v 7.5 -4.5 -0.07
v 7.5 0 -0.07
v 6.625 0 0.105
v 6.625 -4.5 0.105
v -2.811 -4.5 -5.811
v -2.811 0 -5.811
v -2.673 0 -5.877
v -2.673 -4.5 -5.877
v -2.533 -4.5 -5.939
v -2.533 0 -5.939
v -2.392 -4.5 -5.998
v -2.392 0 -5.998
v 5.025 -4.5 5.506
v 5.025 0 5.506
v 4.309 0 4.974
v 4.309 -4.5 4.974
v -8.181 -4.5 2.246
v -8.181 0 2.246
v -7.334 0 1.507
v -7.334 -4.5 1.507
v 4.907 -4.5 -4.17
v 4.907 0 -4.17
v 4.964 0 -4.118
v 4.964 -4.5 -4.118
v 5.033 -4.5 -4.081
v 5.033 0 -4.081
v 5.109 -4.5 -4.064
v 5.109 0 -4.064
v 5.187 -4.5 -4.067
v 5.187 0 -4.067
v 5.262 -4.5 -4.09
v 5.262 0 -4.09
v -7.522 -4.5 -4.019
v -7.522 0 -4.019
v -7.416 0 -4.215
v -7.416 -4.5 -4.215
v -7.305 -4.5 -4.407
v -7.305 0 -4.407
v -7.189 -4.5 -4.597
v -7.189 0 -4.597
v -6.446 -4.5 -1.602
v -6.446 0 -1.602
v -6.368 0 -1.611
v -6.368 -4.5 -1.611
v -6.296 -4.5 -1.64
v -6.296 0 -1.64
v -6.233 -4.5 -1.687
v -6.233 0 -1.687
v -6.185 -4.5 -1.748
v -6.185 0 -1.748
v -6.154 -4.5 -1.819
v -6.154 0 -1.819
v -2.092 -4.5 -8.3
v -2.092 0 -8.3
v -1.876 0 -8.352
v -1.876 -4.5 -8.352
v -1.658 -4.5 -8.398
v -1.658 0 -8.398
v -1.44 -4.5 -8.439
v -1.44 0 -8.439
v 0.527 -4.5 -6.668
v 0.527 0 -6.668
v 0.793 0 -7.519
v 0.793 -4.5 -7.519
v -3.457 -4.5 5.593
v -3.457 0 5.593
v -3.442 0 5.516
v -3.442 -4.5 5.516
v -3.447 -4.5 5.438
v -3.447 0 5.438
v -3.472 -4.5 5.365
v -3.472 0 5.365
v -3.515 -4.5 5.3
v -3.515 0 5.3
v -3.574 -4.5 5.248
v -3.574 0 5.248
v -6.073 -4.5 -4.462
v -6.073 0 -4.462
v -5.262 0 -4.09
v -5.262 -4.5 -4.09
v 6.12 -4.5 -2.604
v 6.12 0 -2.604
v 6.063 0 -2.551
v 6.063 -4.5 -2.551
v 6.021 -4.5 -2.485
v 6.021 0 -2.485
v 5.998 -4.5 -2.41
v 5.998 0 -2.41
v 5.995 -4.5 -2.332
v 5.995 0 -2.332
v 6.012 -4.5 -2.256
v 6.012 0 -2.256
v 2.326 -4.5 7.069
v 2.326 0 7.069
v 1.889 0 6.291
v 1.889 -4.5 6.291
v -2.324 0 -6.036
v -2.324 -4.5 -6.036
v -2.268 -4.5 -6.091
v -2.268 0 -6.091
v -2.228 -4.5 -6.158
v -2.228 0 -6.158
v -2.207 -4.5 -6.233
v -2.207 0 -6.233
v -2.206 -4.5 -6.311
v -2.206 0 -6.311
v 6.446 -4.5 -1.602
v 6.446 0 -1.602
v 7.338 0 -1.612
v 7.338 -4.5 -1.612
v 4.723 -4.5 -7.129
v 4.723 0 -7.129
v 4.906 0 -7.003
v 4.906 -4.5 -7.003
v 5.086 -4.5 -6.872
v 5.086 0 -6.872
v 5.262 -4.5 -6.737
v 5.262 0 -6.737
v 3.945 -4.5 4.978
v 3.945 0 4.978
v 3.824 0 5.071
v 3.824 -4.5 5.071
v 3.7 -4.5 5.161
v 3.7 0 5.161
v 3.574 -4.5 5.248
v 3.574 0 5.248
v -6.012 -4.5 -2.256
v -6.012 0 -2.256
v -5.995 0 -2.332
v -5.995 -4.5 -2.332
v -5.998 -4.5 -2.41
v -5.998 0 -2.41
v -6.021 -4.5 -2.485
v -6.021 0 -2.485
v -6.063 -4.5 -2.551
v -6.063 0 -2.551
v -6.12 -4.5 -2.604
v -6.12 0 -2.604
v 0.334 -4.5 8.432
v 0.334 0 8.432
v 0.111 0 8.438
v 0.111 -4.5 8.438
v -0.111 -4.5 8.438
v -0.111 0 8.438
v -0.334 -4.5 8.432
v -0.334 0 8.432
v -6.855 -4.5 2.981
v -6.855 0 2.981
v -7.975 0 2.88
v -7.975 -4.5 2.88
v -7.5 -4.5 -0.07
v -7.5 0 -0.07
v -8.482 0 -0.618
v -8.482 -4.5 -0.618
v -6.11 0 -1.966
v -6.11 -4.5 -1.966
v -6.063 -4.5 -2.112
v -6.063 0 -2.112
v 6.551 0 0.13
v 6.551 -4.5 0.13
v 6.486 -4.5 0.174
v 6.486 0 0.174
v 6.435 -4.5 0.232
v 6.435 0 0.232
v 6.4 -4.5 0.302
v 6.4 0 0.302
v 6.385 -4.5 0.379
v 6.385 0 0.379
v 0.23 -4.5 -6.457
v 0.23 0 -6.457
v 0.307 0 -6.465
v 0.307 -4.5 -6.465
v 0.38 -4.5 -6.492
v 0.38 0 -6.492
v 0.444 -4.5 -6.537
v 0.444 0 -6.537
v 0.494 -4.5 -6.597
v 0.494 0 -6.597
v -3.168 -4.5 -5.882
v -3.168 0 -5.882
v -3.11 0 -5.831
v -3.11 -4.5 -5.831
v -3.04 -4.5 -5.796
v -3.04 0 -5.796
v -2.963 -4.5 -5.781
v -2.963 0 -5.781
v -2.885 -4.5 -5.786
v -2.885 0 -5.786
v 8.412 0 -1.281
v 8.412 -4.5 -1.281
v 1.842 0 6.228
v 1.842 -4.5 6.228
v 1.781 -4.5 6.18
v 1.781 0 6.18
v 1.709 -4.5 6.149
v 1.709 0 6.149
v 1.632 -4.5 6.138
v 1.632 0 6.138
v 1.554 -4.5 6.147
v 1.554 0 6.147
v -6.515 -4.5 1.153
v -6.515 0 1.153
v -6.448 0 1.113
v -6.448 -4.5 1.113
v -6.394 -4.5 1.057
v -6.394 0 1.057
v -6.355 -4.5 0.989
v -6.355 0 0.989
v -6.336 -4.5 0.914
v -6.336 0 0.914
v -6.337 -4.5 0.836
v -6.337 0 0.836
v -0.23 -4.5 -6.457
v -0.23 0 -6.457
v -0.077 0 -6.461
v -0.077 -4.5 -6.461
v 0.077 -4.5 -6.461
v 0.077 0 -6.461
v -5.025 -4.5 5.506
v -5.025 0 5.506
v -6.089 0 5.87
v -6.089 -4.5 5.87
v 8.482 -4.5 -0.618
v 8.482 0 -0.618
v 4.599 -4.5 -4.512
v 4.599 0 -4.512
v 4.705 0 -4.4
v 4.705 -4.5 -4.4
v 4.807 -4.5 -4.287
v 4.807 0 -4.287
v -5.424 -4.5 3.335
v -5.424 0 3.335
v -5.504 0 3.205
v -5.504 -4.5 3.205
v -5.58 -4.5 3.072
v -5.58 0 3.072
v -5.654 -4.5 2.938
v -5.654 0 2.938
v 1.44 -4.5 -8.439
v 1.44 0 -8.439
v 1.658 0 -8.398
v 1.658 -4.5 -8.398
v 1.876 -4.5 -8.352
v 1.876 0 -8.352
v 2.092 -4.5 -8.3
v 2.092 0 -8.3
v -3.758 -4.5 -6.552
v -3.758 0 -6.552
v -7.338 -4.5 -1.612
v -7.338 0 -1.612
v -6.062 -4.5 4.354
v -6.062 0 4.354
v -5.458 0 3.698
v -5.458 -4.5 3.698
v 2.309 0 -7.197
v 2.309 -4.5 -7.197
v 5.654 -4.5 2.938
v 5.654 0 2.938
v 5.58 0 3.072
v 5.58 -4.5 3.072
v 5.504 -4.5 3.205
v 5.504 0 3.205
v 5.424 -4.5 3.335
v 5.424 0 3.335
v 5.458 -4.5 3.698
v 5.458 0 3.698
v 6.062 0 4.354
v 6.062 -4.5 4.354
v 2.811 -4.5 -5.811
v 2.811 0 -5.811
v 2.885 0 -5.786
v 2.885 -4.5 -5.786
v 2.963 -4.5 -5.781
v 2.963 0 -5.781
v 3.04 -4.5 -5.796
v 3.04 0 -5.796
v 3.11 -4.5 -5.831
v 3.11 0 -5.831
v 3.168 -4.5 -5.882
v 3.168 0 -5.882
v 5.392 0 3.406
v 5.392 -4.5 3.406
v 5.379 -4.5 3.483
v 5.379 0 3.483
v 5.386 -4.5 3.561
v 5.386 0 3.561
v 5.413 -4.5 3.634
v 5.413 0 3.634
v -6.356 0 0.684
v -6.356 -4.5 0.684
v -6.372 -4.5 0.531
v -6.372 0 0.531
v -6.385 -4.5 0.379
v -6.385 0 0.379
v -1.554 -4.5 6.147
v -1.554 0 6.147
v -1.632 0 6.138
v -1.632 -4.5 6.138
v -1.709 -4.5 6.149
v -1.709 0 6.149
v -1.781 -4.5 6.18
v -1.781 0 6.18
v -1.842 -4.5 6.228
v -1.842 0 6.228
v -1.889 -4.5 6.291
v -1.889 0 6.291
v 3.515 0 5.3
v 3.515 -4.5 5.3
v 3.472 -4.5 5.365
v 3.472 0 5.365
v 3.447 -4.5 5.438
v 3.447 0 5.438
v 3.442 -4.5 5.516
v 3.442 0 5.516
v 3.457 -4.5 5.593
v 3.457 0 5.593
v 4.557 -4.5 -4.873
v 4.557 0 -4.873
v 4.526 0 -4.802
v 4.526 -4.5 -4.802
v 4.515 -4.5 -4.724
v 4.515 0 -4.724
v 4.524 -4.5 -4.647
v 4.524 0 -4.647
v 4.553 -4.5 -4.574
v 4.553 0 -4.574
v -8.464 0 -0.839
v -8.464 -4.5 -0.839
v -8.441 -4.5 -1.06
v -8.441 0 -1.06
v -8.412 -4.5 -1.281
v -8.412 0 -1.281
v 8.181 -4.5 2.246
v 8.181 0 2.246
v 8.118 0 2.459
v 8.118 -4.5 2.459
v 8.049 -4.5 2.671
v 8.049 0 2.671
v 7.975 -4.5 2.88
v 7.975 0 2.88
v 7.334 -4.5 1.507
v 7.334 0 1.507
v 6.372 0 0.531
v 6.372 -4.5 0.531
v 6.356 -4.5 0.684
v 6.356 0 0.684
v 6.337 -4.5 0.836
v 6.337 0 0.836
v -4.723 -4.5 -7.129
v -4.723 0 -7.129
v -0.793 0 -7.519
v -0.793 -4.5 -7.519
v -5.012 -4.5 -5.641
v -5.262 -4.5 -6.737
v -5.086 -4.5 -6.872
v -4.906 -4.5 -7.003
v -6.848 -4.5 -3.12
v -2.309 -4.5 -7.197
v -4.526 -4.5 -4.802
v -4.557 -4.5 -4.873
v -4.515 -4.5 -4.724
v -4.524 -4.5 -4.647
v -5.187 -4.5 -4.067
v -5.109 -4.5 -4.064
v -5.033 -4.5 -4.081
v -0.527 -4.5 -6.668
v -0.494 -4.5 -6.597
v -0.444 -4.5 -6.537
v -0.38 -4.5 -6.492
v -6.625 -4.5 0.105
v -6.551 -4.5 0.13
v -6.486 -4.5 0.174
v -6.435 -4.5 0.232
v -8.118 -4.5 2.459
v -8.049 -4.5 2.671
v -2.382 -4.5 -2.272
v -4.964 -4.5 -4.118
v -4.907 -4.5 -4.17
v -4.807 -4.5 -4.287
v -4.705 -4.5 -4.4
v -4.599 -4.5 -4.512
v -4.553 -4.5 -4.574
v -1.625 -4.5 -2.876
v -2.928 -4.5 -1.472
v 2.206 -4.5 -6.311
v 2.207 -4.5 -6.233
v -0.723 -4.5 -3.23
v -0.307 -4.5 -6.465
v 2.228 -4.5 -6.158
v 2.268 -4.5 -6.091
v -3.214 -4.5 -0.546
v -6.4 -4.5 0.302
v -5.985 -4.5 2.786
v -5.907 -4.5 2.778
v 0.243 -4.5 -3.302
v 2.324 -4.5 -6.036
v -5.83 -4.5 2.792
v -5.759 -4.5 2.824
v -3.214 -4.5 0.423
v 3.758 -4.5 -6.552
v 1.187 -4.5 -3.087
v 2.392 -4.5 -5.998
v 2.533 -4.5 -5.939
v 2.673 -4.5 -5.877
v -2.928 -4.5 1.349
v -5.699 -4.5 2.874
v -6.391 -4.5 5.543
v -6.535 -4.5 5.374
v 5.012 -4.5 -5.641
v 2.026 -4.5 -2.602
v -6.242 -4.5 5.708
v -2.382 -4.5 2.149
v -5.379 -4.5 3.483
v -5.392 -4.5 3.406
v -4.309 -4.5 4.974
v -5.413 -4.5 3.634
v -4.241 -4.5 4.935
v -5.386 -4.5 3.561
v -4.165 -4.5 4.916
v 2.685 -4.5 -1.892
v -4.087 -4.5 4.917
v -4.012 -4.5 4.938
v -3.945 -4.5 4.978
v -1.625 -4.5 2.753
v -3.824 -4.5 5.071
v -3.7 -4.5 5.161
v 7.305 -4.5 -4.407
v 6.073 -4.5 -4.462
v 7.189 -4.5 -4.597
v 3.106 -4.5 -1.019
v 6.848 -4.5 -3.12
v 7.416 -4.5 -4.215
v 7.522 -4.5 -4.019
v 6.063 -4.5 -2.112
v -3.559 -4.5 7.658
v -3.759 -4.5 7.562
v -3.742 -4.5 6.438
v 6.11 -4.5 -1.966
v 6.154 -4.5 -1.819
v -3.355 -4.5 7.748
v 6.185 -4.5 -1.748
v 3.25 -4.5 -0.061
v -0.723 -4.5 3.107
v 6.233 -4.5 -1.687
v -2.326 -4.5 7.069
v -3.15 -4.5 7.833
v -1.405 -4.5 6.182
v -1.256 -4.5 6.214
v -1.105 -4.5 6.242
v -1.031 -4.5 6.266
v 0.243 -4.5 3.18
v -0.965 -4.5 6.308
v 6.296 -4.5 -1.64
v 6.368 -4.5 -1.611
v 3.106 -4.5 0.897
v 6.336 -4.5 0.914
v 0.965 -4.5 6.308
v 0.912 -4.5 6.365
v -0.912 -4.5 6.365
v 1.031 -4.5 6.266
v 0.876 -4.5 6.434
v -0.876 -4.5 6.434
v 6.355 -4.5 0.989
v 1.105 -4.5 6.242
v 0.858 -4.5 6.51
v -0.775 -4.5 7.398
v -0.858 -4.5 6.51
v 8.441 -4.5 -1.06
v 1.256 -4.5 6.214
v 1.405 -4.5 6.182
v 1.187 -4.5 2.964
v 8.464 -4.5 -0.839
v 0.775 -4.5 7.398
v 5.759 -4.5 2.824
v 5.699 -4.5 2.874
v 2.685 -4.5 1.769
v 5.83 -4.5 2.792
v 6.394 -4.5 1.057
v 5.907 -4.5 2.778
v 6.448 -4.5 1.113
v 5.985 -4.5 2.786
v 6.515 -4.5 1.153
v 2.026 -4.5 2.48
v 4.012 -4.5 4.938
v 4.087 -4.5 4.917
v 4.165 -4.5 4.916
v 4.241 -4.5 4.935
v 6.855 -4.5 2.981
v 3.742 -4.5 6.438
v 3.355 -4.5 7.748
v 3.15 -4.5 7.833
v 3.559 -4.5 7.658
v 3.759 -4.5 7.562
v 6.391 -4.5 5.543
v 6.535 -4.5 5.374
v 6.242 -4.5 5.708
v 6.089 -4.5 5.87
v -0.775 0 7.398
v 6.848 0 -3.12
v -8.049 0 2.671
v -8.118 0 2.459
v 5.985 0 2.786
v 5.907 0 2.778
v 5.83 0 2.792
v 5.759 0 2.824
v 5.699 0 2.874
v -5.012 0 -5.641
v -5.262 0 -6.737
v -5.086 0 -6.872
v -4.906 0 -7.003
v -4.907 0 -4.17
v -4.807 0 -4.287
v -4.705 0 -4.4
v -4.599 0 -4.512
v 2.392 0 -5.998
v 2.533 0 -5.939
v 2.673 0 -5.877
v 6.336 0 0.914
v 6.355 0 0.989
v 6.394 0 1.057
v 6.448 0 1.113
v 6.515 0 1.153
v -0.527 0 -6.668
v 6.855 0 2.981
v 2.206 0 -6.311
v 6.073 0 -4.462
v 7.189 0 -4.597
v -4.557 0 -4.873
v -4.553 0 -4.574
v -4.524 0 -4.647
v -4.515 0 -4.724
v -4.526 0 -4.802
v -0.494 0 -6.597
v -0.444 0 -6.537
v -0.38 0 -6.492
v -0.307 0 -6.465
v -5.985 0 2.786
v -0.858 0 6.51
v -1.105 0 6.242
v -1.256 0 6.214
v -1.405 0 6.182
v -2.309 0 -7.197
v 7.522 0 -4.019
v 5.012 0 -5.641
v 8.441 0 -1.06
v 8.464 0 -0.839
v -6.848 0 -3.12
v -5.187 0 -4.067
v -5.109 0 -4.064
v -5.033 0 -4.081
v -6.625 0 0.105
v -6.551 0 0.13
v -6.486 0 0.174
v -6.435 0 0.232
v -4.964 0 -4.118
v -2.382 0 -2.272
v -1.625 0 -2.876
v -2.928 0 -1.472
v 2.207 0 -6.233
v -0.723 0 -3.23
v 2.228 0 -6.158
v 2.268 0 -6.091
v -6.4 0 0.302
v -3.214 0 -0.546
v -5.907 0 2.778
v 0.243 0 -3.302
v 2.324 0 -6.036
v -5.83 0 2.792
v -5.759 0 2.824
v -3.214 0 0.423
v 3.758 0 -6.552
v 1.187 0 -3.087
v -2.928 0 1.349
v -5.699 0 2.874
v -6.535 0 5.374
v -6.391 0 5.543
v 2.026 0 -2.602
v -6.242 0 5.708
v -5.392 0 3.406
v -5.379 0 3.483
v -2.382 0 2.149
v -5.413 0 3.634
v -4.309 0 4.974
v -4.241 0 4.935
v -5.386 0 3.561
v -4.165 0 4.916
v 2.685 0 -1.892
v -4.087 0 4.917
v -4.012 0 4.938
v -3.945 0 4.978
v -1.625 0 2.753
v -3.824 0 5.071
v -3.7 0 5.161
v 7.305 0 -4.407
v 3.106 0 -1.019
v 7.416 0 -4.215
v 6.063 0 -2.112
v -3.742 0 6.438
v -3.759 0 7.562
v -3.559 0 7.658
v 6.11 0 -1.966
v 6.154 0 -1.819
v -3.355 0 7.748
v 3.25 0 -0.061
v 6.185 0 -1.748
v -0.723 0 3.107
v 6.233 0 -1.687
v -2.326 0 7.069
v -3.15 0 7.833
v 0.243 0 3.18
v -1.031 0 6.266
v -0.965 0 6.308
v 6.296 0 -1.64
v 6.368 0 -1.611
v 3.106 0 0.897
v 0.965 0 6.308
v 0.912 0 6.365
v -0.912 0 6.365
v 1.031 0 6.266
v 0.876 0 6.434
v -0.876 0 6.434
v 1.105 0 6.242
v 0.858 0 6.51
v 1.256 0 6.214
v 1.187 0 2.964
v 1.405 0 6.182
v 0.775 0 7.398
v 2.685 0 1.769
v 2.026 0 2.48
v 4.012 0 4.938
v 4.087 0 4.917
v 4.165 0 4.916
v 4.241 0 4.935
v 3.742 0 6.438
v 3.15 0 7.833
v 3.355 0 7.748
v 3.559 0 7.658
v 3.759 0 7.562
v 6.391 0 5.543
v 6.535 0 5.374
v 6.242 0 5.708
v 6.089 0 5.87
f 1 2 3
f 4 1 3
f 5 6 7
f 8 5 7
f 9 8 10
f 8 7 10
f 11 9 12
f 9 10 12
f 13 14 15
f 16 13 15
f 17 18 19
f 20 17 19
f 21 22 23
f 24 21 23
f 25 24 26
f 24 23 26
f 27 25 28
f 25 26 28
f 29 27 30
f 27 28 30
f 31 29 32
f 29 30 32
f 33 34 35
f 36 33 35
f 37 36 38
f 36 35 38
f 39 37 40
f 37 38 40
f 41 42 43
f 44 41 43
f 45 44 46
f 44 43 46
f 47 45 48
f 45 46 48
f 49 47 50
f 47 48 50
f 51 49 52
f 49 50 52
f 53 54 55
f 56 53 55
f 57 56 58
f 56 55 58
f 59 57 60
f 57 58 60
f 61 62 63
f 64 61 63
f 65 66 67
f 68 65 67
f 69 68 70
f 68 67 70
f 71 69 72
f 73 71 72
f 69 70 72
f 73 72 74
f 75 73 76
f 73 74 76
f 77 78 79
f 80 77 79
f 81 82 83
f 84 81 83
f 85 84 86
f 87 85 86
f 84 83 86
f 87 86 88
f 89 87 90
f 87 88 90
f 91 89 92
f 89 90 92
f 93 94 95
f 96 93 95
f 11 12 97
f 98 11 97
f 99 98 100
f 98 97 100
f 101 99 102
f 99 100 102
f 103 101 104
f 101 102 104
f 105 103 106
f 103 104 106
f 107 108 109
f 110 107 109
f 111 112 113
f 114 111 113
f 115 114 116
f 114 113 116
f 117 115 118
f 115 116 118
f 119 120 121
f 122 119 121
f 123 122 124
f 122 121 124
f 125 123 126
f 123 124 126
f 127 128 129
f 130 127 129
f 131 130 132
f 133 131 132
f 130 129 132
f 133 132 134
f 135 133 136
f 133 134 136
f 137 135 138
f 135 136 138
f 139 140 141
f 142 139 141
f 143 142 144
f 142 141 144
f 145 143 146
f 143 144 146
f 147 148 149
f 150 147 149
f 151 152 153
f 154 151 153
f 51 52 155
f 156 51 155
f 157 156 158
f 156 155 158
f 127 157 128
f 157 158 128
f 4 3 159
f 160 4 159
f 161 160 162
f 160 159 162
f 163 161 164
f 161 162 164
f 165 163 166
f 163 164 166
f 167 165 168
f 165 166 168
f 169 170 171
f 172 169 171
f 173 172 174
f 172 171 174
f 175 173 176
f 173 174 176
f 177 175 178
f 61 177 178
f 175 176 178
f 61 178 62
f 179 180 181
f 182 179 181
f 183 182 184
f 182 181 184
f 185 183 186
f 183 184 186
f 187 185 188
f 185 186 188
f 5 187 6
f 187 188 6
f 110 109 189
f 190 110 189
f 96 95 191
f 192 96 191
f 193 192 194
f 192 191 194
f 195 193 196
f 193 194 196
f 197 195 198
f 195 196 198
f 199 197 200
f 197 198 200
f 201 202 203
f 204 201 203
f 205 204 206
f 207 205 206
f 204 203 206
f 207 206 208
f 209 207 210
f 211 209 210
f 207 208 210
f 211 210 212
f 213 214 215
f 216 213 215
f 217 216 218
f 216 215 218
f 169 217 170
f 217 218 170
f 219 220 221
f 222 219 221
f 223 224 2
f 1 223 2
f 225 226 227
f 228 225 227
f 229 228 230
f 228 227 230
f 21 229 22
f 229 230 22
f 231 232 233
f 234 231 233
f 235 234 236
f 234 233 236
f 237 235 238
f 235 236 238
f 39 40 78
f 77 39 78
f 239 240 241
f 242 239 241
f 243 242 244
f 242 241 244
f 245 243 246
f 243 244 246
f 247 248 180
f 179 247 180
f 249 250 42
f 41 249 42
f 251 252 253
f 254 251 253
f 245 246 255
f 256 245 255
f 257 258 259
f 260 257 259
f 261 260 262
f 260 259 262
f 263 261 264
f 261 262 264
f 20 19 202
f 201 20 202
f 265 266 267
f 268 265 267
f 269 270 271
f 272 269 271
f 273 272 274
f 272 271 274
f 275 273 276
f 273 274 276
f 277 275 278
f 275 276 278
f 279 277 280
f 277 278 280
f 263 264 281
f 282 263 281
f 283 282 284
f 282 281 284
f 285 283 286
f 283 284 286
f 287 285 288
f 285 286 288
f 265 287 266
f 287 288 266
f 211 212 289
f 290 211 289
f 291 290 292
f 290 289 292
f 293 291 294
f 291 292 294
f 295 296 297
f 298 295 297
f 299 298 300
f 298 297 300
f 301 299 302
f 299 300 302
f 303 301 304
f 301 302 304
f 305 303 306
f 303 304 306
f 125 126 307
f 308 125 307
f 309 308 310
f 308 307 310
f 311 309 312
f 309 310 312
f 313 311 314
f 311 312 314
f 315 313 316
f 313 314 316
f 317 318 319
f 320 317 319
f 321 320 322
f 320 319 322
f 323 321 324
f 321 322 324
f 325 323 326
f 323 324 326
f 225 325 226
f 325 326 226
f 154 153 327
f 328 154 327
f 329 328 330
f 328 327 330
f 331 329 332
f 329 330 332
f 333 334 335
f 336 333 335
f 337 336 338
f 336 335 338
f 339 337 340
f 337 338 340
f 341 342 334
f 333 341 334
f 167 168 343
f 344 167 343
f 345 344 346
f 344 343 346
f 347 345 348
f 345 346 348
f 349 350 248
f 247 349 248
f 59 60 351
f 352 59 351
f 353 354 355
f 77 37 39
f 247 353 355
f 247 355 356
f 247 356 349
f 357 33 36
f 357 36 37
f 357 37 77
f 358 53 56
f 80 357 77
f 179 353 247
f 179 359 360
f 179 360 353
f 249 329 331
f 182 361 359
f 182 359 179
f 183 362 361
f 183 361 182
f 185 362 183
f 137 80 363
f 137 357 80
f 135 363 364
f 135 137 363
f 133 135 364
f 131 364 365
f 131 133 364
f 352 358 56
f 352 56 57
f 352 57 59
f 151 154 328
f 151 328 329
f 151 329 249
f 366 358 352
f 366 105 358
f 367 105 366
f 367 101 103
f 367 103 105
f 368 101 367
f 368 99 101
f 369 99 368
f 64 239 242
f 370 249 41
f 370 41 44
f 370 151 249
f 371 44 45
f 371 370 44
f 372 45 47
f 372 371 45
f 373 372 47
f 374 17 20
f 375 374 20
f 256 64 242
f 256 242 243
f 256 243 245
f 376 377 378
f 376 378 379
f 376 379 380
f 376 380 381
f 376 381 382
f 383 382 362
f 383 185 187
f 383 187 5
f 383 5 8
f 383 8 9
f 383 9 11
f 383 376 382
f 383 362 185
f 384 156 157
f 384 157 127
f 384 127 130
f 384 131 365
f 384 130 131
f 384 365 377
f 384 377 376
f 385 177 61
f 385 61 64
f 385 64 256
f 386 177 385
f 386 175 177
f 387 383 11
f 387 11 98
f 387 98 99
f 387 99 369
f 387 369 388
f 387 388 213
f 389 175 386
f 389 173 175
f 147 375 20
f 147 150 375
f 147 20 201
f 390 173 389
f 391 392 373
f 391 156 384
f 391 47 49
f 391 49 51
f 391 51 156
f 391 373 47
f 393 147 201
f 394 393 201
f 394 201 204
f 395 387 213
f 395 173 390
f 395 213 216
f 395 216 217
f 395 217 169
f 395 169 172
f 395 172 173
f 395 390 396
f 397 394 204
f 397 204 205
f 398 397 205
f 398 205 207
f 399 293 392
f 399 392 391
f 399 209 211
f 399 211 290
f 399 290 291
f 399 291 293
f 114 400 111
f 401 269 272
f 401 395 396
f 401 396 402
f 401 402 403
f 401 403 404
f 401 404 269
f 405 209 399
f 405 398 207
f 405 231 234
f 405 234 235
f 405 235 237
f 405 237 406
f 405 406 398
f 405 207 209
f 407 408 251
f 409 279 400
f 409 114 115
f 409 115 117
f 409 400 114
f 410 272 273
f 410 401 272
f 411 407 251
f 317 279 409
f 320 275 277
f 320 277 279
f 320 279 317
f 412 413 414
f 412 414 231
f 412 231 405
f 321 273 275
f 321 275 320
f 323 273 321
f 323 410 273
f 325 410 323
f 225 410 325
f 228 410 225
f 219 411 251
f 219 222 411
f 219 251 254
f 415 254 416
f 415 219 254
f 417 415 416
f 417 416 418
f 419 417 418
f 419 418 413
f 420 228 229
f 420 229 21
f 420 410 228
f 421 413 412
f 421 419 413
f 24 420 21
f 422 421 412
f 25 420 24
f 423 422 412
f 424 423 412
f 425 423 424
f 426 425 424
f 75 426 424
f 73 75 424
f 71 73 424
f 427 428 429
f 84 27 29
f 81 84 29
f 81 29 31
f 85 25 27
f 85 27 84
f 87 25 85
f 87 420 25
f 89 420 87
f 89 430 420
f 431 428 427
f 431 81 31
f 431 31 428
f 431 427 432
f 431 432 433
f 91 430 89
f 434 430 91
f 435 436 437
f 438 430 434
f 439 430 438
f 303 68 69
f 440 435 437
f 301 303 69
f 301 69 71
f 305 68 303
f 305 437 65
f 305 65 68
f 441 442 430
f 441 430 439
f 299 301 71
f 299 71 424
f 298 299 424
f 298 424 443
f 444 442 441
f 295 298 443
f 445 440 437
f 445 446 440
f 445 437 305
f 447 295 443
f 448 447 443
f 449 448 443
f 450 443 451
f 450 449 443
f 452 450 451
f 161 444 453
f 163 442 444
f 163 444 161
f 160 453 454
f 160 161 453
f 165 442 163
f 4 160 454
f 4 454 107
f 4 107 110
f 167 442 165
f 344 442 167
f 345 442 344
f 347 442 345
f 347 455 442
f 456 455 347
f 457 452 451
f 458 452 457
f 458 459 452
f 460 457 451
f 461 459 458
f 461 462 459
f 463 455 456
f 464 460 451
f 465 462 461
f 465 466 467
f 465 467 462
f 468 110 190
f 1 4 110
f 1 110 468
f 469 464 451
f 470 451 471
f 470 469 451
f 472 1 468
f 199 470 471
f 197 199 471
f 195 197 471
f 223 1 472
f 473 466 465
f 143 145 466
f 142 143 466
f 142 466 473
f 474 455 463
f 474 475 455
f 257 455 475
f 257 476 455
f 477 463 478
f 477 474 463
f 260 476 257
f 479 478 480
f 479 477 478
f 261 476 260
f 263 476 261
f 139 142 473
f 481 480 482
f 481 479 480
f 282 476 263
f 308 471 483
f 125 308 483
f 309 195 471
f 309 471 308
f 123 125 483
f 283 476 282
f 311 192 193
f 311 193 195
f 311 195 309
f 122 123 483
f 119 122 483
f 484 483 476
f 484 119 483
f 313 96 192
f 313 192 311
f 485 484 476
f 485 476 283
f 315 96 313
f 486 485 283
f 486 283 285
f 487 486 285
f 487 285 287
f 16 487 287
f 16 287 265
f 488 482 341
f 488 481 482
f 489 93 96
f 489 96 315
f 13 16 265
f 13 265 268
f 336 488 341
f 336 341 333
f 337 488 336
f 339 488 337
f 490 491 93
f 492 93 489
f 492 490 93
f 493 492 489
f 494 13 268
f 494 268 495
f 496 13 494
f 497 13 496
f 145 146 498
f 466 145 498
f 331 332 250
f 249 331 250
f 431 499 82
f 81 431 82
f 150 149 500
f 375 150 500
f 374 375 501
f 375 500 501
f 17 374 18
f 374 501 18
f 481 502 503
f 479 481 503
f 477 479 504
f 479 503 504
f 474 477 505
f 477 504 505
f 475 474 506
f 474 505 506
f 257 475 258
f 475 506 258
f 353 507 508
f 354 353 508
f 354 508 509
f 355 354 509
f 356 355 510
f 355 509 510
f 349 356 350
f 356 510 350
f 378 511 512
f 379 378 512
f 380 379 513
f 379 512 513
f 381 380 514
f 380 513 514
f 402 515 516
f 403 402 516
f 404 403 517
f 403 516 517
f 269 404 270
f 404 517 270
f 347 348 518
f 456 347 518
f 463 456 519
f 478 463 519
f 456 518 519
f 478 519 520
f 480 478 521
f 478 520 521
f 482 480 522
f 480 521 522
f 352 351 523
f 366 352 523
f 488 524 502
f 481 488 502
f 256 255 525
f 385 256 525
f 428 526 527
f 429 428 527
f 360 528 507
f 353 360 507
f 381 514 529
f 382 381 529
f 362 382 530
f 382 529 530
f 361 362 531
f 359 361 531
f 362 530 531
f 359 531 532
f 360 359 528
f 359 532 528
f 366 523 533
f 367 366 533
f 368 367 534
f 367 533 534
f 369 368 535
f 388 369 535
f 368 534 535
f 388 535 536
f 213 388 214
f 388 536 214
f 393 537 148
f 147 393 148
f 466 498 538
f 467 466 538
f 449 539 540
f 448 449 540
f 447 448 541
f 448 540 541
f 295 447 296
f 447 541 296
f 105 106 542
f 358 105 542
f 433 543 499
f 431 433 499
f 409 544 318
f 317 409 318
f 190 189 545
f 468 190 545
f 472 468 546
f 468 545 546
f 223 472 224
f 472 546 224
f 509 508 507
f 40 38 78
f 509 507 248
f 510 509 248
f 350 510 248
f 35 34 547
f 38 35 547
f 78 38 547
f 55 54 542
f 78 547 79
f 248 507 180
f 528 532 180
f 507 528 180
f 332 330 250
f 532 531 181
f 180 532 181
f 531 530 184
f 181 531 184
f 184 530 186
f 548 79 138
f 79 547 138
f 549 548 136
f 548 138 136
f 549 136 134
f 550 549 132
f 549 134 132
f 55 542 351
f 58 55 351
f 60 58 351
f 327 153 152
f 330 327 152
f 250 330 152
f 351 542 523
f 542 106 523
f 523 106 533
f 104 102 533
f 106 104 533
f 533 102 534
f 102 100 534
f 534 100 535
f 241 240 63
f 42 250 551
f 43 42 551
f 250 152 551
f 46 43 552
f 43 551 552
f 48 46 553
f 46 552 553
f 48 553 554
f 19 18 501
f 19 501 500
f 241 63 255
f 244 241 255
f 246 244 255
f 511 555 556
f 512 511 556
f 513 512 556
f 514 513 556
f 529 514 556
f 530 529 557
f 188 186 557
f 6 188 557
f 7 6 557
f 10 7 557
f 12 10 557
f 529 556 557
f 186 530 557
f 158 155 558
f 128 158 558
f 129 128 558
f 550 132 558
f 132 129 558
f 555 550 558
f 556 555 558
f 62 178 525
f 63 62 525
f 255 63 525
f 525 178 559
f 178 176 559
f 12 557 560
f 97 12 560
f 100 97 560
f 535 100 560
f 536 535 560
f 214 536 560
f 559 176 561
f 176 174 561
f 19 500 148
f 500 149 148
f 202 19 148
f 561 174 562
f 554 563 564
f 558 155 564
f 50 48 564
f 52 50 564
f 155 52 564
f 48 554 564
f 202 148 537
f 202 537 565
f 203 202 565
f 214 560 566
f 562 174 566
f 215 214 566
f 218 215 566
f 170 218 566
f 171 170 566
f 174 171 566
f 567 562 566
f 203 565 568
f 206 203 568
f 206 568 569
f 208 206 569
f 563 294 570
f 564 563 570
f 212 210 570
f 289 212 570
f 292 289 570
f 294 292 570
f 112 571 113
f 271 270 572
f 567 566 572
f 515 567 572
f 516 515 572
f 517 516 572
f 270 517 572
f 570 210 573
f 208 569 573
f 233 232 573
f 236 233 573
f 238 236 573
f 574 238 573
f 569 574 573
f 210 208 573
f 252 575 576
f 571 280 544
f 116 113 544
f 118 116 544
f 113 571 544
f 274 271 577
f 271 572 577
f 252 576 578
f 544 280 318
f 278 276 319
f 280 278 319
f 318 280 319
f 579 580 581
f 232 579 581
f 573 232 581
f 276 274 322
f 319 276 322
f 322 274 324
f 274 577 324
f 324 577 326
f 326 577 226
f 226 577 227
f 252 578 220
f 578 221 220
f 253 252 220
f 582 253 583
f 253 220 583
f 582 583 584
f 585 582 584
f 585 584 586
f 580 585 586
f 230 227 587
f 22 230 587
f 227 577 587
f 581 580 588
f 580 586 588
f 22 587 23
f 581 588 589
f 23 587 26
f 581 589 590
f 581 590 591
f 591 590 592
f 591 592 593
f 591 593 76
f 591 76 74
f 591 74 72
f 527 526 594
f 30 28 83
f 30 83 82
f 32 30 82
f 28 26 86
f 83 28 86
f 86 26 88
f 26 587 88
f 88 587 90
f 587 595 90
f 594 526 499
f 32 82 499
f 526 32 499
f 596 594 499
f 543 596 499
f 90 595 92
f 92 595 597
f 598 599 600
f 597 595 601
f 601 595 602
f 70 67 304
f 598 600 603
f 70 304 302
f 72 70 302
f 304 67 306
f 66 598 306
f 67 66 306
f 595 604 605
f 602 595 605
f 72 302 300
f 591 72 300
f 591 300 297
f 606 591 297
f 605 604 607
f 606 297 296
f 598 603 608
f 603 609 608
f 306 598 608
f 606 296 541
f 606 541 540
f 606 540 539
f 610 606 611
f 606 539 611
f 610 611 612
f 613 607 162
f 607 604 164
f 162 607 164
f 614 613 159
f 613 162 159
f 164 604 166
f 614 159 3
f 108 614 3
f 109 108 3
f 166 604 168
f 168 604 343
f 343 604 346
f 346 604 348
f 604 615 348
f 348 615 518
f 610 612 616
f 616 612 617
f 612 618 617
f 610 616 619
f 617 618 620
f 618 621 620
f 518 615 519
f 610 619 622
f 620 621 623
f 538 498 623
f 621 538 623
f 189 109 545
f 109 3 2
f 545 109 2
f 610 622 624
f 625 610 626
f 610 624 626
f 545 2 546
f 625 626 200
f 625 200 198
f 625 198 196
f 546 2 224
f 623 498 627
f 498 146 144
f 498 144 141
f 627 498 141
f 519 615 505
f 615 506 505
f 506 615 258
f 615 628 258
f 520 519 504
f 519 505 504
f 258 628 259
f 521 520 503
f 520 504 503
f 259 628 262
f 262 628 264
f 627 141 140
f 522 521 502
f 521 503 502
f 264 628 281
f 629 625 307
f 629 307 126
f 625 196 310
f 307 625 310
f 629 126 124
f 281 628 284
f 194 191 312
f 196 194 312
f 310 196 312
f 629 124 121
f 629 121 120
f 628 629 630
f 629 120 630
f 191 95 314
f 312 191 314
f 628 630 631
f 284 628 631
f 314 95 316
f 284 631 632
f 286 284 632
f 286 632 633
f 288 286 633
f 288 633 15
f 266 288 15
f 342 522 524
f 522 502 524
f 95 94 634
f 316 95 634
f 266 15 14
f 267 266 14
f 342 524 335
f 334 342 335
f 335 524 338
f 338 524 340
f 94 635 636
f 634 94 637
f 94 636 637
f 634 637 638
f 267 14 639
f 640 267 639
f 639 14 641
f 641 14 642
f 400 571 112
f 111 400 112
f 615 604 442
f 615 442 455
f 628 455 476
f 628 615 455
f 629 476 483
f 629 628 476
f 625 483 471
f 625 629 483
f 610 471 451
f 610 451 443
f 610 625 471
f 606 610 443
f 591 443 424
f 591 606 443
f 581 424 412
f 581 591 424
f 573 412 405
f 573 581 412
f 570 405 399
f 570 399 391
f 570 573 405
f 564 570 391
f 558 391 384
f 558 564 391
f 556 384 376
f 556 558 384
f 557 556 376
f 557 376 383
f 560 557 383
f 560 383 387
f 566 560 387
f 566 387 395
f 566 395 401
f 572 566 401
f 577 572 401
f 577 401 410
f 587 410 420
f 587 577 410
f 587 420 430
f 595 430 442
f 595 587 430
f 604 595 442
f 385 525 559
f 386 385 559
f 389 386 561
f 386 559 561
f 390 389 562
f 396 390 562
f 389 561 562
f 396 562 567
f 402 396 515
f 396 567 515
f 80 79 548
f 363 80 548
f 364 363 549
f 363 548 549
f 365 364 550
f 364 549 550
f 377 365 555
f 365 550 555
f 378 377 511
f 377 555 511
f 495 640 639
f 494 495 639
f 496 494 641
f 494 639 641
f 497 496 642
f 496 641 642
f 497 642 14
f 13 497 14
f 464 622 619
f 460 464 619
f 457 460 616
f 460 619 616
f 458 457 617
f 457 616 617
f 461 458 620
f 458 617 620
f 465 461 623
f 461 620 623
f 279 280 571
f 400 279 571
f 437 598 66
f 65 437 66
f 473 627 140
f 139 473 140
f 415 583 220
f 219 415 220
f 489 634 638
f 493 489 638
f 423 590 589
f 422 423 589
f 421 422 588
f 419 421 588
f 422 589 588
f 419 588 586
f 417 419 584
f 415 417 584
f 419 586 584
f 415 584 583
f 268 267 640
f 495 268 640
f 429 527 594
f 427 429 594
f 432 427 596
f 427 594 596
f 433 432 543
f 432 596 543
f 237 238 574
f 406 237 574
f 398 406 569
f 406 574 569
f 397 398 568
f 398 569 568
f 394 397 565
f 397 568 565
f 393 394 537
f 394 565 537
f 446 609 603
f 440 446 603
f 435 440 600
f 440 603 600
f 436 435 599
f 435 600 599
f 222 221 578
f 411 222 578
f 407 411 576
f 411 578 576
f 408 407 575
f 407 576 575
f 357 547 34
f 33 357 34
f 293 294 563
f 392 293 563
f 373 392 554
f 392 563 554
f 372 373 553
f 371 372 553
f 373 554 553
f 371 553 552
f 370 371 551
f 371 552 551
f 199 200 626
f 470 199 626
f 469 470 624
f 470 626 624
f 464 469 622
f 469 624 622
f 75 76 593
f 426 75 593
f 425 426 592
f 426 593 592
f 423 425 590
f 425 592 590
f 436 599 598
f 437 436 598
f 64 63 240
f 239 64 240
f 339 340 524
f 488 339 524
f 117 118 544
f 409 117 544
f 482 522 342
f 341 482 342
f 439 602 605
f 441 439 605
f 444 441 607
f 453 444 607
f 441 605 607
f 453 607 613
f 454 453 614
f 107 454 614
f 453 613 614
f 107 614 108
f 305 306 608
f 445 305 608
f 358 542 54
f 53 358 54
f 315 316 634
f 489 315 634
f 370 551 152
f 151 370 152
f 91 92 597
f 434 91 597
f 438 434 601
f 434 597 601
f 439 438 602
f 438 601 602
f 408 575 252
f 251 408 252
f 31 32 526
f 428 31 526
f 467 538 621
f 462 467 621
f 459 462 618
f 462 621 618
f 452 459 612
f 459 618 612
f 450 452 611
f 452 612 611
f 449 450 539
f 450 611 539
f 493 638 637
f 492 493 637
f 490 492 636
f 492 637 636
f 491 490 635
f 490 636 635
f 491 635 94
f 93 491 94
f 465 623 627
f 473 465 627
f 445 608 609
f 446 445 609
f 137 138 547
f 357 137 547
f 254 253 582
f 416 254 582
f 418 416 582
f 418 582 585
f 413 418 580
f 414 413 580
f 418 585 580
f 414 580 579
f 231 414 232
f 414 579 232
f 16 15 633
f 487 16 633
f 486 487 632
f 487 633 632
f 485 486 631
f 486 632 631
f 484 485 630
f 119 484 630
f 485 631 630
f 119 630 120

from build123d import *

# Parameters (mm, degrees)
F0_R     = 3.25
F1_DEPTH = 4.5


# Not quite as in the source:
# - ends of sketch curves that miss each other by under 0.0002 mm in the source are joined


with BuildPart() as f1:
    # F0 (on Front) → F1 (new body)
    with BuildSketch(Plane.XZ):
        with BuildLine():
            ThreePointArc((-6.3848473051, 0.378745021), (-6.458741388, 0.201395137), (-6.6250810223, 0.1052471112))
            Line((-6.6250810223, 0.1052471112), (-7.499995, -0.070416))
            Line((-7.499995, -0.070416), (-8.481787, -0.617539))
            ThreePointArc((-8.481787, -0.617539), (-8.4534361937, -0.9498951475), (-8.4120672698, -1.2808810391))
            Line((-8.4120672698, -1.2808810391), (-7.337975, -1.611925))
            Line((-7.337975, -1.611925), (-6.445659, -1.601845))
            ThreePointArc((-6.445659, -1.601845), (-6.2629631412, -1.6613077046), (-6.1538101366, -1.819419039))
            ThreePointArc((-6.1538101366, -1.819419039), (-6.0867618577, -2.039112292), (-6.0118718389, -2.2562609412))
            ThreePointArc((-6.0118718389, -2.2562609412), (-6.0072434399, -2.4483319562), (-6.120095855, -2.6038242044))
            Line((-6.120095855, -2.6038242044), (-6.84792, -3.12016))
            Line((-6.84792, -3.12016), (-7.522298, -4.019312))
            ThreePointArc((-7.522298, -4.019312), (-7.3612165371, -4.3114029523), (-7.1888002117, -4.5969471336))
            Line((-7.1888002117, -4.5969471336), (-6.07292, -4.462499))
            Line((-6.07292, -4.462499), (-5.261849, -4.090353))
            ThreePointArc((-5.261849, -4.090353), (-5.0707630565, -4.0703658396), (-4.9067374821, -4.1704104038))
            ThreePointArc((-4.9067374821, -4.1704104038), (-4.7561274158, -4.343839289), (-4.5993898038, -4.5117538102))
            ThreePointArc((-4.5993898038, -4.5117538102), (-4.5170386347, -4.6853377004), (-4.5568904277, -4.8732883391))
            Line((-4.5568904277, -4.8732883391), (-5.011778, -5.641017))
            Line((-5.011778, -5.641017), (-5.262135, -6.736727))
            ThreePointArc((-5.262135, -6.736727), (-4.9961722078, -6.9380502226), (-4.7225170454, -7.128782068))
            Line((-4.7225170454, -7.128782068), (-3.757802, -6.552084))
            Line((-3.757802, -6.552084), (-3.168217, -5.882218))
            ThreePointArc((-3.168217, -5.882218), (-3.0017803181, -5.7862379026), (-2.8112432041, -5.8109184175))
            ThreePointArc((-2.8112432041, -5.8109184175), (-2.6031126369, -5.9080957654), (-2.3916319825, -5.9977409564))
            ThreePointArc((-2.3916319825, -5.9977409564), (-2.2457975094, -6.1228225948), (-2.2057577098, -6.3107329173))
            Line((-2.2057577098, -6.3107329173), (-2.309055, -7.197108))
            Line((-2.309055, -7.197108), (-2.092101, -8.299918))
            ThreePointArc((-2.092101, -8.299918), (-1.7672462291, -8.3756592743), (-1.4396719873, -8.4385959262))
            Line((-1.4396719873, -8.4385959262), (-0.792926, -7.519371))
            Line((-0.792926, -7.519371), (-0.526772, -6.667613))
            ThreePointArc((-0.526772, -6.667613), (-0.4137637804, -6.5122339125), (-0.2296610073, -6.457282204))
            ThreePointArc((-0.2296610073, -6.457282204), (2.4984e-06, -6.461404), (0.229662, -6.457281998))
            ThreePointArc((0.229662, -6.457281998), (0.4137637804, -6.5122339125), (0.5267720218, -6.6676129932))
            Line((0.5267720218, -6.6676129932), (0.792926, -7.519371))
            Line((0.792926, -7.519371), (1.439676, -8.438595))
            ThreePointArc((1.439676, -8.438595), (1.7672522889, -8.3756579862), (2.0921050032, -8.2999170124))
            Line((2.0921050032, -8.2999170124), (2.309055, -7.197108))
            Line((2.309055, -7.197108), (2.205757, -6.310733))
            ThreePointArc((2.205757, -6.310733), (2.2457975094, -6.1228225948), (2.3916327595, -5.9977404031))
            ThreePointArc((2.3916327595, -5.9977404031), (2.6031159206, -5.9080943034), (2.8112438605, -5.8109177148))
            ThreePointArc((2.8112438605, -5.8109177148), (3.0017803181, -5.7862379026), (3.1682168748, -5.8822191102))
            Line((3.1682168748, -5.8822191102), (3.757802, -6.552084))
            Line((3.757802, -6.552084), (4.72252, -7.12878))
            ThreePointArc((4.72252, -7.12878), (4.9961769033, -6.9380468111), (5.2621377529, -6.7367246866))
            Line((5.2621377529, -6.7367246866), (5.011778, -5.641017))
            Line((5.011778, -5.641017), (4.556891, -4.873288))
            ThreePointArc((4.556891, -4.873288), (4.5170386766, -4.6853373435), (4.599391221, -4.5117522139))
            ThreePointArc((4.599391221, -4.5117522139), (4.7561281073, -4.3438385211), (4.9067371021, -4.1704100855))
            ThreePointArc((4.9067371021, -4.1704100855), (5.0707626825, -4.0703659239), (5.2618489304, -4.0903531516))
            Line((5.2618489304, -4.0903531516), (6.07292, -4.462499))
            Line((6.07292, -4.462499), (7.188798, -4.596951))
            ThreePointArc((7.188798, -4.596951), (7.361216975, -4.3114021938), (7.5222993001, -4.0193091579))
            Line((7.5222993001, -4.0193091579), (6.84792, -3.12016))
            Line((6.84792, -3.12016), (6.120096, -2.603824))
            ThreePointArc((6.120096, -2.603824), (6.0072434399, -2.4483319562), (6.0118725915, -2.2562588509))
            ThreePointArc((6.0118725915, -2.2562588509), (6.0867621941, -2.0391112566), (6.153810771, -1.8194179346))
            ThreePointArc((6.153810771, -1.8194179346), (6.2629631412, -1.6613077046), (6.4456589984, -1.6018451428))
            Line((6.4456589984, -1.6018451428), (7.337975, -1.611925))
            Line((7.337975, -1.611925), (8.412067, -1.280885))
            ThreePointArc((8.412067, -1.280885), (8.4534363514, -0.9498936467), (8.481787446, -0.6175350292))
            Line((8.481787446, -0.6175350292), (7.499995, -0.070416))
            Line((7.499995, -0.070416), (6.625082, 0.105247))
            ThreePointArc((6.625082, 0.105247), (6.4587417115, 0.2013947687), (6.3848473051, 0.378745021))
            ThreePointArc((6.3848473051, 0.378745021), (6.3649400086, 0.6075793237), (6.3368346677, 0.835549953))
            ThreePointArc((6.3368346677, 0.835549953), (6.3722414368, 1.0243877393), (6.5149571212, 1.1530187192))
            Line((6.5149571212, 1.1530187192), (7.334228, 1.506748))
            Line((7.334228, 1.506748), (8.180813, 2.246041))
            ThreePointArc((8.180813, 2.246041), (8.0839798549, 2.5652420945), (7.974697483, 2.8803981782))
            Line((7.974697483, 2.8803981782), (6.855252, 2.980885))
            Line((6.855252, 2.980885), (5.98453, 2.785503))
            ThreePointArc((5.98453, 2.785503), (5.7934636286, 2.8056817814), (5.6538228924, 2.9376439429))
            ThreePointArc((5.6538228924, 2.9376439429), (5.5425619412, 3.1385971137), (5.4241623811, 3.3354272386))
            ThreePointArc((5.4241623811, 3.3354272386), (5.3797004129, 3.5223406923), (5.4577587633, 3.697898218))
            Line((5.4577587633, 3.697898218), (6.062326, 4.354273))
            Line((6.062326, 4.354273), (6.535022, 5.373988))
            ThreePointArc((6.535022, 5.373988), (6.3167298633, 5.6262074349), (6.088709809, 5.8696678139))
            Line((6.088709809, 5.8696678139), (5.025173, 5.506148))
            Line((5.025173, 5.506148), (4.309199, 4.973502))
            ThreePointArc((4.309199, 4.973502), (4.1264437672, 4.9142226849), (3.9452018311, 4.9779787843))
            ThreePointArc((3.9452018311, 4.9779787843), (3.7618245482, 5.1163055389), (3.5736032135, 5.2479613173))
            ThreePointArc((3.5736032135, 5.2479613173), (3.4569607105, 5.4006300799), (3.4568644648, 5.5927591806))
            Line((3.4568644648, 5.5927591806), (3.742192, 6.438288))
            Line((3.742192, 6.438288), (3.759267, 7.562107))
            ThreePointArc((3.759267, 7.562107), (3.4572596135, 7.7037332148), (3.1499290285, 7.8334010714))
            Line((3.1499290285, 7.8334010714), (2.326197, 7.06873))
            Line((2.326197, 7.06873), (1.888768, 6.290921))
            ThreePointArc((1.888768, 6.290921), (1.7459243673, 6.1624334899), (1.554419964, 6.1469598562))
            ThreePointArc((1.554419964, 6.1469598562), (1.3306339934, 6.1987408207), (1.1051359772, 6.2424578697))
            ThreePointArc((1.1051359772, 6.2424578697), (0.9364810051, 6.3344853457), (0.8582472195, 6.5099649269))
            Line((0.8582472195, 6.5099649269), (0.775, 7.398447))
            Line((0.775, 7.398447), (0.3335, 8.432051))
            ThreePointArc((0.3335, 8.432051), (-1.4988e-06, 8.438596), (-0.3335029952, 8.4320508773))
            Line((-0.3335029952, 8.4320508773), (-0.775, 7.398447))
            Line((-0.775, 7.398447), (-0.858248, 6.509965))
            ThreePointArc((-0.858248, 6.509965), (-0.9364806674, 6.3344857115), (-1.1051359033, 6.2424574482))
            ThreePointArc((-1.1051359033, 6.2424574482), (-1.3306359057, 6.1987404142), (-1.5544199034, 6.146959614))
            ThreePointArc((-1.5544199034, 6.146959614), (-1.7459243673, 6.1624334899), (-1.8887681854, 6.2909208957))
            Line((-1.8887681854, 6.2909208957), (-2.326197, 7.06873))
            Line((-2.326197, 7.06873), (-3.149932, 7.8334))
            ThreePointArc((-3.149932, 7.8334), (-3.4572626886, 7.7037318457), (-3.759269185, 7.5621053752))
            Line((-3.759269185, 7.5621053752), (-3.742192, 6.438288))
            Line((-3.742192, 6.438288), (-3.456865, 5.59276))
            ThreePointArc((-3.456865, 5.59276), (-3.4569605775, 5.4006304728), (-3.5736028777, 5.2479608182))
            ThreePointArc((-3.5736028777, 5.2479608182), (-3.7618263316, 5.1163042431), (-3.9452020076, 4.9779790098))
            ThreePointArc((-3.9452020076, 4.9779790098), (-4.1264437672, 4.9142226849), (-4.3091988413, 4.9735022134))
            Line((-4.3091988413, 4.9735022134), (-5.025173, 5.506148))
            Line((-5.025173, 5.506148), (-6.088712, 5.869665))
            ThreePointArc((-6.088712, 5.869665), (-6.3167319914, 5.6262050713), (-6.5350238583, 5.3739858822))
            Line((-6.5350238583, 5.3739858822), (-6.062326, 4.354273))
            Line((-6.062326, 4.354273), (-5.457759, 3.697898))
            ThreePointArc((-5.457759, 3.697898), (-5.3797004129, 3.5223406923), (-5.4241620701, 3.3354270439))
            ThreePointArc((-5.4241620701, 3.3354270439), (-5.5425631892, 3.1385949521), (-5.6538231778, 2.9376430943))
            ThreePointArc((-5.6538231778, 2.9376430943), (-5.7934636286, 2.8056817814), (-5.9845300103, 2.785502954))
            Line((-5.9845300103, 2.785502954), (-6.855252, 2.980885))
            Line((-6.855252, 2.980885), (-7.974699, 2.880395))
            ThreePointArc((-7.974699, 2.880395), (-8.0839806406, 2.5652396762), (-8.1808133092, 2.2460390872))
            Line((-8.1808133092, 2.2460390872), (-7.334228, 1.506748))
            Line((-7.334228, 1.506748), (-6.514956, 1.153019))
            ThreePointArc((-6.514956, 1.153019), (-6.3722414368, 1.0243877393), (-6.3368349167, 0.8355489882))
            ThreePointArc((-6.3368349167, 0.8355489882), (-6.3649402163, 0.6075773468), (-6.3848473051, 0.378745021))
        make_face()
        with Locations((0, -0.061404)):
            Circle(F0_R, mode=Mode.SUBTRACT)
    extrude(amount=F1_DEPTH)


solid = f1.part
